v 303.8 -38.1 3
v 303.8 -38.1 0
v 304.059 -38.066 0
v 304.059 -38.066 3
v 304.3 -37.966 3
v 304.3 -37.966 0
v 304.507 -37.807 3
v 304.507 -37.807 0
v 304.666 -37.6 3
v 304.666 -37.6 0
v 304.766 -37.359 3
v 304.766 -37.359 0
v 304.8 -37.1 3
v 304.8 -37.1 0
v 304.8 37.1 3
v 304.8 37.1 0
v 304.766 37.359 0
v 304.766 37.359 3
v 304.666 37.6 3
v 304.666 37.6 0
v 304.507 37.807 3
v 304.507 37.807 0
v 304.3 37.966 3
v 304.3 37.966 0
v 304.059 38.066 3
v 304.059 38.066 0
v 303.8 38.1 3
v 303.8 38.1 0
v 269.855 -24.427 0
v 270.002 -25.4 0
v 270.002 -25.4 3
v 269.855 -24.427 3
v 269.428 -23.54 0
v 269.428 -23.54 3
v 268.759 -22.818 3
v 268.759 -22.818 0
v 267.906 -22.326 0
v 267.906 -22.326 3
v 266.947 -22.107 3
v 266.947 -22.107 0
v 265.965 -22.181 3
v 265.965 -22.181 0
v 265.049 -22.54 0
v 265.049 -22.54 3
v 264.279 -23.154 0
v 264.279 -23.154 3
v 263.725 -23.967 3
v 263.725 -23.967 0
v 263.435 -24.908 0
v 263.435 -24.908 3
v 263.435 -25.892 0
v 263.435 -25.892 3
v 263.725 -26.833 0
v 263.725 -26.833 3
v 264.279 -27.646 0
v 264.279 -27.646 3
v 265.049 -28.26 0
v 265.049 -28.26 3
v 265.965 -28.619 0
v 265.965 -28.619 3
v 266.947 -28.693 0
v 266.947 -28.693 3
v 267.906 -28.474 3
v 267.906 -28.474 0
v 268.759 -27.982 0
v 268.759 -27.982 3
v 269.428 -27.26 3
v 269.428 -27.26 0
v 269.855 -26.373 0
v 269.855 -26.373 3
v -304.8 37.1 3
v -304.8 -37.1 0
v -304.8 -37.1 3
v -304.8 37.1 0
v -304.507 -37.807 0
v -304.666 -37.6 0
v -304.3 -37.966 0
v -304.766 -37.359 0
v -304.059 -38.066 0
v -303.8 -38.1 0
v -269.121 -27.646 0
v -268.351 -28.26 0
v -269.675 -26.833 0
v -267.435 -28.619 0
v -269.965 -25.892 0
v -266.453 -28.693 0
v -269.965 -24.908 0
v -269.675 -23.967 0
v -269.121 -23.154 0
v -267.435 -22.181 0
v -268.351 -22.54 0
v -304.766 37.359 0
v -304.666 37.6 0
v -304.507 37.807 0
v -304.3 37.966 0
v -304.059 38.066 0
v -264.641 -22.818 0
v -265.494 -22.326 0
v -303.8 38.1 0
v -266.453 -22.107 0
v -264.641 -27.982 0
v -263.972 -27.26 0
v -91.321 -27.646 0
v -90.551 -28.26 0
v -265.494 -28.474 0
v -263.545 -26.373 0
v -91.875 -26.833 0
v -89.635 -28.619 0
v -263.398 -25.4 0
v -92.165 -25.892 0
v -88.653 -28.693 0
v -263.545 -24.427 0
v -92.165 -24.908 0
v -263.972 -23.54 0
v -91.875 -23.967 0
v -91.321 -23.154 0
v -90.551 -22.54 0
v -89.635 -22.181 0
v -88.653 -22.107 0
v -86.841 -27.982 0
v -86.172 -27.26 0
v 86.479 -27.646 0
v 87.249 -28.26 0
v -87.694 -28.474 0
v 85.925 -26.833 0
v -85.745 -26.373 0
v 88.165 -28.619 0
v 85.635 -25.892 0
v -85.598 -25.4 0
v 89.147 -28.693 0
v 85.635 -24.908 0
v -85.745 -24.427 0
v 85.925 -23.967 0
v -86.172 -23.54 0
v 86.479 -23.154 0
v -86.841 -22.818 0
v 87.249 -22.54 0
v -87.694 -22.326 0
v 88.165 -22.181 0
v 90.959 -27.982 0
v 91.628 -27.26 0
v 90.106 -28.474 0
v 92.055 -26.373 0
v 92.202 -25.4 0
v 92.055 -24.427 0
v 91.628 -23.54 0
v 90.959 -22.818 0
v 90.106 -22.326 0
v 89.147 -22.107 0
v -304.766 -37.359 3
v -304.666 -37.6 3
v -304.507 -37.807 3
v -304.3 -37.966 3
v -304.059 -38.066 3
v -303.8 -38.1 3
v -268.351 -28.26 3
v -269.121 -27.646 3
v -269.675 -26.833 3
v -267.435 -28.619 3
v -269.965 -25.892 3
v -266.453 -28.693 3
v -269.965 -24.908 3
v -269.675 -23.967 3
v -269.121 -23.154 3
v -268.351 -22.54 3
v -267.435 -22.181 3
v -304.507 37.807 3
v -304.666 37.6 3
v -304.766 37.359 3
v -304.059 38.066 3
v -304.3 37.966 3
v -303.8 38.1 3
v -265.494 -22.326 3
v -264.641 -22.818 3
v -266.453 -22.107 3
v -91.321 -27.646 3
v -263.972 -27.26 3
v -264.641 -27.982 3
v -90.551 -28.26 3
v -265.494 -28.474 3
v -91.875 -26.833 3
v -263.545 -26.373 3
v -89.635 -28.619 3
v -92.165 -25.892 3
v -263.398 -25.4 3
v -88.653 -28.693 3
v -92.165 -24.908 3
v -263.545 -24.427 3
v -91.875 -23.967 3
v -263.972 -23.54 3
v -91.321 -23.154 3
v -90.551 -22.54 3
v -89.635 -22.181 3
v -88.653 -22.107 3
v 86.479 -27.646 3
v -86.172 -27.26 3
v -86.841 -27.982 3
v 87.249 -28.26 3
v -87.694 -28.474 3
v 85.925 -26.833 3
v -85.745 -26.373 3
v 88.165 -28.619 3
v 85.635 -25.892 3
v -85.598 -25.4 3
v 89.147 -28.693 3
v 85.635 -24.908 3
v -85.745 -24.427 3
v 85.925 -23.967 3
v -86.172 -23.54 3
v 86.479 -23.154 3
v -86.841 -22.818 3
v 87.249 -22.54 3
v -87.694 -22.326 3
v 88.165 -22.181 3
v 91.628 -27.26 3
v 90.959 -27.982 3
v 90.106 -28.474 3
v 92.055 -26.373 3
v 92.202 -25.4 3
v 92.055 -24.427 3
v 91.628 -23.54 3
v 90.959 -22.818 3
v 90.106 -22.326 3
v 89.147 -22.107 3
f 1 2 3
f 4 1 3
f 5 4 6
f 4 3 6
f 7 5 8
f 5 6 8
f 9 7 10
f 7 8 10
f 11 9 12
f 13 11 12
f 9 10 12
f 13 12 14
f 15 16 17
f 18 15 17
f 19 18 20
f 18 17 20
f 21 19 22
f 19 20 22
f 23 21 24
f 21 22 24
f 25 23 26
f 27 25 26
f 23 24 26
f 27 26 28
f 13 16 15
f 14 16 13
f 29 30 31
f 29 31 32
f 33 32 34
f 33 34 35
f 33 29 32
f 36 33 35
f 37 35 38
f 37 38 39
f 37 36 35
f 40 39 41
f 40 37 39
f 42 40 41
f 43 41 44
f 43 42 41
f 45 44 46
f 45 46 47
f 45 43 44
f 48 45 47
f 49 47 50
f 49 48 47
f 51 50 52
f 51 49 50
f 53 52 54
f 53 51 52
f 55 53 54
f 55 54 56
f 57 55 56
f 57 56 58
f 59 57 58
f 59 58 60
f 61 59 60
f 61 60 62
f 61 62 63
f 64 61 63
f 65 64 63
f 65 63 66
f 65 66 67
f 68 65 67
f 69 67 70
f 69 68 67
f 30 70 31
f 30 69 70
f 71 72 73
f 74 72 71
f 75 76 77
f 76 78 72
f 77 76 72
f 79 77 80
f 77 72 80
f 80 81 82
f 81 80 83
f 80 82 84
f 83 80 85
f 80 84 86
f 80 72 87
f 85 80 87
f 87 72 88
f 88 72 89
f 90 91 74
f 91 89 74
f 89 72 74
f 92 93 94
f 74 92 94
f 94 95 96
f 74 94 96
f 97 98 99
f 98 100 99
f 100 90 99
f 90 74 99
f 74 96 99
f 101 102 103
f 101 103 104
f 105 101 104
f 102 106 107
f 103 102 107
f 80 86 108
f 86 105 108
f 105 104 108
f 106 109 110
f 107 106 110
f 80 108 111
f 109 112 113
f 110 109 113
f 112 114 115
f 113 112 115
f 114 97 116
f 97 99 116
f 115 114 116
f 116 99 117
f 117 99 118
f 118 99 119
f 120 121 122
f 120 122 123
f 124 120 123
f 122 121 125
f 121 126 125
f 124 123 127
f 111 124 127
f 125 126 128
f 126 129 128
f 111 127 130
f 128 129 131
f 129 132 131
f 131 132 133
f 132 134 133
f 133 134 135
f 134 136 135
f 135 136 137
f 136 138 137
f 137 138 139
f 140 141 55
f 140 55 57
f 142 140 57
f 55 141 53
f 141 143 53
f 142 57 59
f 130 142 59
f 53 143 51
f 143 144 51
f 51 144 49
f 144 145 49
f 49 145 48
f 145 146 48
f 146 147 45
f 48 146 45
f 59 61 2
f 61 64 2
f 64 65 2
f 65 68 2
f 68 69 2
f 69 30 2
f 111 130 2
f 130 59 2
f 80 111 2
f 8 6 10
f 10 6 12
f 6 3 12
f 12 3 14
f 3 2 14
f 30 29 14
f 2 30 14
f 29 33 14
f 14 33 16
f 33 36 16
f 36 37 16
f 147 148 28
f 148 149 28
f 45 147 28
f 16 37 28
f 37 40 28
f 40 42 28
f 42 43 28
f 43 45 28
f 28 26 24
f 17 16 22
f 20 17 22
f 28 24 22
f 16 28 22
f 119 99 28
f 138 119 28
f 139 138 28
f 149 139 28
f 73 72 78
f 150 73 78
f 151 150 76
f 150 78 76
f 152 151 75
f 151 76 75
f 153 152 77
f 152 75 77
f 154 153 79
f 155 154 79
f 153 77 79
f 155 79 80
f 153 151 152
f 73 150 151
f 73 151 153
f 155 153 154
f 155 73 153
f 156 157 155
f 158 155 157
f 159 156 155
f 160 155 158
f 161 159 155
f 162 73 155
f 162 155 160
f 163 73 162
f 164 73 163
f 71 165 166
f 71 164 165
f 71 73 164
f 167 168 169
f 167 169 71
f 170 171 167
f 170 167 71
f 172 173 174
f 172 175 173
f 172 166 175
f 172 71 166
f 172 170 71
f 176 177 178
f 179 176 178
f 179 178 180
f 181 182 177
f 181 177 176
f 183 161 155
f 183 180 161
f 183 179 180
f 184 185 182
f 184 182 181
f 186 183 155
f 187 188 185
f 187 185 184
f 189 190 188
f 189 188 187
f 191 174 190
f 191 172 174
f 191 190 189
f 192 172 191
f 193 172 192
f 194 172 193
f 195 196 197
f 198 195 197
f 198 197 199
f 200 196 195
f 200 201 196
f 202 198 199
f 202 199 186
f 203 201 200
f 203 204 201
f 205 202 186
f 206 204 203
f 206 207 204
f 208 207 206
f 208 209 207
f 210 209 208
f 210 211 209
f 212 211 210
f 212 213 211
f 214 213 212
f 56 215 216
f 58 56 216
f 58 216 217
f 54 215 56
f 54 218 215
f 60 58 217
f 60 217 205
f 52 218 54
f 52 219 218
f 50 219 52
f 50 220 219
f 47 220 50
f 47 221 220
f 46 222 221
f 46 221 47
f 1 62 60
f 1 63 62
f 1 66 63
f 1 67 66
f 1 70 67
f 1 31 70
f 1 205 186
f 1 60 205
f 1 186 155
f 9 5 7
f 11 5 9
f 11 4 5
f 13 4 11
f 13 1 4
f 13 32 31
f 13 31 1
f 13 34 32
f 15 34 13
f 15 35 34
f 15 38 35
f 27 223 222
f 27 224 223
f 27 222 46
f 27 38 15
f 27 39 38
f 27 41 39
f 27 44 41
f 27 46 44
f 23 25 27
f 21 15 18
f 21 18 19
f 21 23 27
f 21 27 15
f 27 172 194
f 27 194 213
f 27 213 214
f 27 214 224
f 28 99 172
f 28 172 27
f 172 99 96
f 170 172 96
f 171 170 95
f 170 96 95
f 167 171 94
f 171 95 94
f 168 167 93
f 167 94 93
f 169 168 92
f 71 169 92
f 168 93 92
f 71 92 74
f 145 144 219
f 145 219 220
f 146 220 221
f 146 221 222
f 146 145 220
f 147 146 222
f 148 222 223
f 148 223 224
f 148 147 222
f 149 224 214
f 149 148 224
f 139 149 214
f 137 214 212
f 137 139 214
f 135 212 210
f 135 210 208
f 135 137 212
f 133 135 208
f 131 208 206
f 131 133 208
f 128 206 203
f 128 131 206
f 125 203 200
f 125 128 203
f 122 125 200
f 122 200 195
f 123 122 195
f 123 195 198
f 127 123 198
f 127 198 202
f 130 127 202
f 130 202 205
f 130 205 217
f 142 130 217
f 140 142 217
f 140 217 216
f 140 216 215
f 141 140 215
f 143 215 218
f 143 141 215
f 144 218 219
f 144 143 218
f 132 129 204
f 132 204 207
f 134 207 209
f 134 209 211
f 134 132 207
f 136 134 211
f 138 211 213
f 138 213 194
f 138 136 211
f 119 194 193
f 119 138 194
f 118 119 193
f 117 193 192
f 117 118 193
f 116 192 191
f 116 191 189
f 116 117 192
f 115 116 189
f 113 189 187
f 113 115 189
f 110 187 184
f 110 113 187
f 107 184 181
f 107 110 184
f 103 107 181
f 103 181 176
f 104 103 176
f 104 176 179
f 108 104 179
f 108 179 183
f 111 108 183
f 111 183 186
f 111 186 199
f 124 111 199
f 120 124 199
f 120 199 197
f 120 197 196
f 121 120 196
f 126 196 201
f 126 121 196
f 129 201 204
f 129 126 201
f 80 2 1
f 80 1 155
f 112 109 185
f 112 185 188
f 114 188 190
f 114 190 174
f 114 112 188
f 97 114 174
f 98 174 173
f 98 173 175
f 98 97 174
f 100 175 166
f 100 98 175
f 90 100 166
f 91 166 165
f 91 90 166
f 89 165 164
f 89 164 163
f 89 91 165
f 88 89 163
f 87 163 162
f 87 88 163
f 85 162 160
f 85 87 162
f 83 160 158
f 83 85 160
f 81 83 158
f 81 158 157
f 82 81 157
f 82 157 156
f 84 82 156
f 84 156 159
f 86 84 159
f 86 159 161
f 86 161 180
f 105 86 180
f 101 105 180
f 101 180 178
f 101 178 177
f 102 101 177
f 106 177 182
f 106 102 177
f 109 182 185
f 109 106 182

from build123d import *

# Parameters (mm, degrees)
SKETCH_R  = 3.302
PAD_DEPTH = 3


with BuildPart() as part:
    # Sketch → Pad (new body)
    with BuildSketch(Plane.XY):
        with BuildLine():
            ThreePointArc((-303.8, 38.1), (-304.507107, 37.807107), (-304.8, 37.1))
            Line((-304.8, -37.1), (-304.8, 37.1))
            ThreePointArc((-304.8, -37.1), (-304.507107, -37.807107), (-303.8, -38.1))
            Line((303.8, -38.1), (-303.8, -38.1))
            ThreePointArc((303.8, -38.1), (304.507107, -37.807107), (304.8, -37.1))
            Line((304.8, 37.1), (304.8, -37.1))
            ThreePointArc((304.8, 37.1), (304.507107, 37.807107), (303.8, 38.1))
            Line((-303.8, 38.1), (303.8, 38.1))
        make_face()
        with Locations((-266.7, -25.4)):
            Circle(SKETCH_R, mode=Mode.SUBTRACT)
        with Locations((-88.9, -25.4)):
            Circle(SKETCH_R, mode=Mode.SUBTRACT)
        with Locations((88.9, -25.4)):
            Circle(SKETCH_R, mode=Mode.SUBTRACT)
        with Locations((266.7, -25.4)):
            Circle(SKETCH_R, mode=Mode.SUBTRACT)
    extrude(amount=PAD_DEPTH)


solid = part.part
